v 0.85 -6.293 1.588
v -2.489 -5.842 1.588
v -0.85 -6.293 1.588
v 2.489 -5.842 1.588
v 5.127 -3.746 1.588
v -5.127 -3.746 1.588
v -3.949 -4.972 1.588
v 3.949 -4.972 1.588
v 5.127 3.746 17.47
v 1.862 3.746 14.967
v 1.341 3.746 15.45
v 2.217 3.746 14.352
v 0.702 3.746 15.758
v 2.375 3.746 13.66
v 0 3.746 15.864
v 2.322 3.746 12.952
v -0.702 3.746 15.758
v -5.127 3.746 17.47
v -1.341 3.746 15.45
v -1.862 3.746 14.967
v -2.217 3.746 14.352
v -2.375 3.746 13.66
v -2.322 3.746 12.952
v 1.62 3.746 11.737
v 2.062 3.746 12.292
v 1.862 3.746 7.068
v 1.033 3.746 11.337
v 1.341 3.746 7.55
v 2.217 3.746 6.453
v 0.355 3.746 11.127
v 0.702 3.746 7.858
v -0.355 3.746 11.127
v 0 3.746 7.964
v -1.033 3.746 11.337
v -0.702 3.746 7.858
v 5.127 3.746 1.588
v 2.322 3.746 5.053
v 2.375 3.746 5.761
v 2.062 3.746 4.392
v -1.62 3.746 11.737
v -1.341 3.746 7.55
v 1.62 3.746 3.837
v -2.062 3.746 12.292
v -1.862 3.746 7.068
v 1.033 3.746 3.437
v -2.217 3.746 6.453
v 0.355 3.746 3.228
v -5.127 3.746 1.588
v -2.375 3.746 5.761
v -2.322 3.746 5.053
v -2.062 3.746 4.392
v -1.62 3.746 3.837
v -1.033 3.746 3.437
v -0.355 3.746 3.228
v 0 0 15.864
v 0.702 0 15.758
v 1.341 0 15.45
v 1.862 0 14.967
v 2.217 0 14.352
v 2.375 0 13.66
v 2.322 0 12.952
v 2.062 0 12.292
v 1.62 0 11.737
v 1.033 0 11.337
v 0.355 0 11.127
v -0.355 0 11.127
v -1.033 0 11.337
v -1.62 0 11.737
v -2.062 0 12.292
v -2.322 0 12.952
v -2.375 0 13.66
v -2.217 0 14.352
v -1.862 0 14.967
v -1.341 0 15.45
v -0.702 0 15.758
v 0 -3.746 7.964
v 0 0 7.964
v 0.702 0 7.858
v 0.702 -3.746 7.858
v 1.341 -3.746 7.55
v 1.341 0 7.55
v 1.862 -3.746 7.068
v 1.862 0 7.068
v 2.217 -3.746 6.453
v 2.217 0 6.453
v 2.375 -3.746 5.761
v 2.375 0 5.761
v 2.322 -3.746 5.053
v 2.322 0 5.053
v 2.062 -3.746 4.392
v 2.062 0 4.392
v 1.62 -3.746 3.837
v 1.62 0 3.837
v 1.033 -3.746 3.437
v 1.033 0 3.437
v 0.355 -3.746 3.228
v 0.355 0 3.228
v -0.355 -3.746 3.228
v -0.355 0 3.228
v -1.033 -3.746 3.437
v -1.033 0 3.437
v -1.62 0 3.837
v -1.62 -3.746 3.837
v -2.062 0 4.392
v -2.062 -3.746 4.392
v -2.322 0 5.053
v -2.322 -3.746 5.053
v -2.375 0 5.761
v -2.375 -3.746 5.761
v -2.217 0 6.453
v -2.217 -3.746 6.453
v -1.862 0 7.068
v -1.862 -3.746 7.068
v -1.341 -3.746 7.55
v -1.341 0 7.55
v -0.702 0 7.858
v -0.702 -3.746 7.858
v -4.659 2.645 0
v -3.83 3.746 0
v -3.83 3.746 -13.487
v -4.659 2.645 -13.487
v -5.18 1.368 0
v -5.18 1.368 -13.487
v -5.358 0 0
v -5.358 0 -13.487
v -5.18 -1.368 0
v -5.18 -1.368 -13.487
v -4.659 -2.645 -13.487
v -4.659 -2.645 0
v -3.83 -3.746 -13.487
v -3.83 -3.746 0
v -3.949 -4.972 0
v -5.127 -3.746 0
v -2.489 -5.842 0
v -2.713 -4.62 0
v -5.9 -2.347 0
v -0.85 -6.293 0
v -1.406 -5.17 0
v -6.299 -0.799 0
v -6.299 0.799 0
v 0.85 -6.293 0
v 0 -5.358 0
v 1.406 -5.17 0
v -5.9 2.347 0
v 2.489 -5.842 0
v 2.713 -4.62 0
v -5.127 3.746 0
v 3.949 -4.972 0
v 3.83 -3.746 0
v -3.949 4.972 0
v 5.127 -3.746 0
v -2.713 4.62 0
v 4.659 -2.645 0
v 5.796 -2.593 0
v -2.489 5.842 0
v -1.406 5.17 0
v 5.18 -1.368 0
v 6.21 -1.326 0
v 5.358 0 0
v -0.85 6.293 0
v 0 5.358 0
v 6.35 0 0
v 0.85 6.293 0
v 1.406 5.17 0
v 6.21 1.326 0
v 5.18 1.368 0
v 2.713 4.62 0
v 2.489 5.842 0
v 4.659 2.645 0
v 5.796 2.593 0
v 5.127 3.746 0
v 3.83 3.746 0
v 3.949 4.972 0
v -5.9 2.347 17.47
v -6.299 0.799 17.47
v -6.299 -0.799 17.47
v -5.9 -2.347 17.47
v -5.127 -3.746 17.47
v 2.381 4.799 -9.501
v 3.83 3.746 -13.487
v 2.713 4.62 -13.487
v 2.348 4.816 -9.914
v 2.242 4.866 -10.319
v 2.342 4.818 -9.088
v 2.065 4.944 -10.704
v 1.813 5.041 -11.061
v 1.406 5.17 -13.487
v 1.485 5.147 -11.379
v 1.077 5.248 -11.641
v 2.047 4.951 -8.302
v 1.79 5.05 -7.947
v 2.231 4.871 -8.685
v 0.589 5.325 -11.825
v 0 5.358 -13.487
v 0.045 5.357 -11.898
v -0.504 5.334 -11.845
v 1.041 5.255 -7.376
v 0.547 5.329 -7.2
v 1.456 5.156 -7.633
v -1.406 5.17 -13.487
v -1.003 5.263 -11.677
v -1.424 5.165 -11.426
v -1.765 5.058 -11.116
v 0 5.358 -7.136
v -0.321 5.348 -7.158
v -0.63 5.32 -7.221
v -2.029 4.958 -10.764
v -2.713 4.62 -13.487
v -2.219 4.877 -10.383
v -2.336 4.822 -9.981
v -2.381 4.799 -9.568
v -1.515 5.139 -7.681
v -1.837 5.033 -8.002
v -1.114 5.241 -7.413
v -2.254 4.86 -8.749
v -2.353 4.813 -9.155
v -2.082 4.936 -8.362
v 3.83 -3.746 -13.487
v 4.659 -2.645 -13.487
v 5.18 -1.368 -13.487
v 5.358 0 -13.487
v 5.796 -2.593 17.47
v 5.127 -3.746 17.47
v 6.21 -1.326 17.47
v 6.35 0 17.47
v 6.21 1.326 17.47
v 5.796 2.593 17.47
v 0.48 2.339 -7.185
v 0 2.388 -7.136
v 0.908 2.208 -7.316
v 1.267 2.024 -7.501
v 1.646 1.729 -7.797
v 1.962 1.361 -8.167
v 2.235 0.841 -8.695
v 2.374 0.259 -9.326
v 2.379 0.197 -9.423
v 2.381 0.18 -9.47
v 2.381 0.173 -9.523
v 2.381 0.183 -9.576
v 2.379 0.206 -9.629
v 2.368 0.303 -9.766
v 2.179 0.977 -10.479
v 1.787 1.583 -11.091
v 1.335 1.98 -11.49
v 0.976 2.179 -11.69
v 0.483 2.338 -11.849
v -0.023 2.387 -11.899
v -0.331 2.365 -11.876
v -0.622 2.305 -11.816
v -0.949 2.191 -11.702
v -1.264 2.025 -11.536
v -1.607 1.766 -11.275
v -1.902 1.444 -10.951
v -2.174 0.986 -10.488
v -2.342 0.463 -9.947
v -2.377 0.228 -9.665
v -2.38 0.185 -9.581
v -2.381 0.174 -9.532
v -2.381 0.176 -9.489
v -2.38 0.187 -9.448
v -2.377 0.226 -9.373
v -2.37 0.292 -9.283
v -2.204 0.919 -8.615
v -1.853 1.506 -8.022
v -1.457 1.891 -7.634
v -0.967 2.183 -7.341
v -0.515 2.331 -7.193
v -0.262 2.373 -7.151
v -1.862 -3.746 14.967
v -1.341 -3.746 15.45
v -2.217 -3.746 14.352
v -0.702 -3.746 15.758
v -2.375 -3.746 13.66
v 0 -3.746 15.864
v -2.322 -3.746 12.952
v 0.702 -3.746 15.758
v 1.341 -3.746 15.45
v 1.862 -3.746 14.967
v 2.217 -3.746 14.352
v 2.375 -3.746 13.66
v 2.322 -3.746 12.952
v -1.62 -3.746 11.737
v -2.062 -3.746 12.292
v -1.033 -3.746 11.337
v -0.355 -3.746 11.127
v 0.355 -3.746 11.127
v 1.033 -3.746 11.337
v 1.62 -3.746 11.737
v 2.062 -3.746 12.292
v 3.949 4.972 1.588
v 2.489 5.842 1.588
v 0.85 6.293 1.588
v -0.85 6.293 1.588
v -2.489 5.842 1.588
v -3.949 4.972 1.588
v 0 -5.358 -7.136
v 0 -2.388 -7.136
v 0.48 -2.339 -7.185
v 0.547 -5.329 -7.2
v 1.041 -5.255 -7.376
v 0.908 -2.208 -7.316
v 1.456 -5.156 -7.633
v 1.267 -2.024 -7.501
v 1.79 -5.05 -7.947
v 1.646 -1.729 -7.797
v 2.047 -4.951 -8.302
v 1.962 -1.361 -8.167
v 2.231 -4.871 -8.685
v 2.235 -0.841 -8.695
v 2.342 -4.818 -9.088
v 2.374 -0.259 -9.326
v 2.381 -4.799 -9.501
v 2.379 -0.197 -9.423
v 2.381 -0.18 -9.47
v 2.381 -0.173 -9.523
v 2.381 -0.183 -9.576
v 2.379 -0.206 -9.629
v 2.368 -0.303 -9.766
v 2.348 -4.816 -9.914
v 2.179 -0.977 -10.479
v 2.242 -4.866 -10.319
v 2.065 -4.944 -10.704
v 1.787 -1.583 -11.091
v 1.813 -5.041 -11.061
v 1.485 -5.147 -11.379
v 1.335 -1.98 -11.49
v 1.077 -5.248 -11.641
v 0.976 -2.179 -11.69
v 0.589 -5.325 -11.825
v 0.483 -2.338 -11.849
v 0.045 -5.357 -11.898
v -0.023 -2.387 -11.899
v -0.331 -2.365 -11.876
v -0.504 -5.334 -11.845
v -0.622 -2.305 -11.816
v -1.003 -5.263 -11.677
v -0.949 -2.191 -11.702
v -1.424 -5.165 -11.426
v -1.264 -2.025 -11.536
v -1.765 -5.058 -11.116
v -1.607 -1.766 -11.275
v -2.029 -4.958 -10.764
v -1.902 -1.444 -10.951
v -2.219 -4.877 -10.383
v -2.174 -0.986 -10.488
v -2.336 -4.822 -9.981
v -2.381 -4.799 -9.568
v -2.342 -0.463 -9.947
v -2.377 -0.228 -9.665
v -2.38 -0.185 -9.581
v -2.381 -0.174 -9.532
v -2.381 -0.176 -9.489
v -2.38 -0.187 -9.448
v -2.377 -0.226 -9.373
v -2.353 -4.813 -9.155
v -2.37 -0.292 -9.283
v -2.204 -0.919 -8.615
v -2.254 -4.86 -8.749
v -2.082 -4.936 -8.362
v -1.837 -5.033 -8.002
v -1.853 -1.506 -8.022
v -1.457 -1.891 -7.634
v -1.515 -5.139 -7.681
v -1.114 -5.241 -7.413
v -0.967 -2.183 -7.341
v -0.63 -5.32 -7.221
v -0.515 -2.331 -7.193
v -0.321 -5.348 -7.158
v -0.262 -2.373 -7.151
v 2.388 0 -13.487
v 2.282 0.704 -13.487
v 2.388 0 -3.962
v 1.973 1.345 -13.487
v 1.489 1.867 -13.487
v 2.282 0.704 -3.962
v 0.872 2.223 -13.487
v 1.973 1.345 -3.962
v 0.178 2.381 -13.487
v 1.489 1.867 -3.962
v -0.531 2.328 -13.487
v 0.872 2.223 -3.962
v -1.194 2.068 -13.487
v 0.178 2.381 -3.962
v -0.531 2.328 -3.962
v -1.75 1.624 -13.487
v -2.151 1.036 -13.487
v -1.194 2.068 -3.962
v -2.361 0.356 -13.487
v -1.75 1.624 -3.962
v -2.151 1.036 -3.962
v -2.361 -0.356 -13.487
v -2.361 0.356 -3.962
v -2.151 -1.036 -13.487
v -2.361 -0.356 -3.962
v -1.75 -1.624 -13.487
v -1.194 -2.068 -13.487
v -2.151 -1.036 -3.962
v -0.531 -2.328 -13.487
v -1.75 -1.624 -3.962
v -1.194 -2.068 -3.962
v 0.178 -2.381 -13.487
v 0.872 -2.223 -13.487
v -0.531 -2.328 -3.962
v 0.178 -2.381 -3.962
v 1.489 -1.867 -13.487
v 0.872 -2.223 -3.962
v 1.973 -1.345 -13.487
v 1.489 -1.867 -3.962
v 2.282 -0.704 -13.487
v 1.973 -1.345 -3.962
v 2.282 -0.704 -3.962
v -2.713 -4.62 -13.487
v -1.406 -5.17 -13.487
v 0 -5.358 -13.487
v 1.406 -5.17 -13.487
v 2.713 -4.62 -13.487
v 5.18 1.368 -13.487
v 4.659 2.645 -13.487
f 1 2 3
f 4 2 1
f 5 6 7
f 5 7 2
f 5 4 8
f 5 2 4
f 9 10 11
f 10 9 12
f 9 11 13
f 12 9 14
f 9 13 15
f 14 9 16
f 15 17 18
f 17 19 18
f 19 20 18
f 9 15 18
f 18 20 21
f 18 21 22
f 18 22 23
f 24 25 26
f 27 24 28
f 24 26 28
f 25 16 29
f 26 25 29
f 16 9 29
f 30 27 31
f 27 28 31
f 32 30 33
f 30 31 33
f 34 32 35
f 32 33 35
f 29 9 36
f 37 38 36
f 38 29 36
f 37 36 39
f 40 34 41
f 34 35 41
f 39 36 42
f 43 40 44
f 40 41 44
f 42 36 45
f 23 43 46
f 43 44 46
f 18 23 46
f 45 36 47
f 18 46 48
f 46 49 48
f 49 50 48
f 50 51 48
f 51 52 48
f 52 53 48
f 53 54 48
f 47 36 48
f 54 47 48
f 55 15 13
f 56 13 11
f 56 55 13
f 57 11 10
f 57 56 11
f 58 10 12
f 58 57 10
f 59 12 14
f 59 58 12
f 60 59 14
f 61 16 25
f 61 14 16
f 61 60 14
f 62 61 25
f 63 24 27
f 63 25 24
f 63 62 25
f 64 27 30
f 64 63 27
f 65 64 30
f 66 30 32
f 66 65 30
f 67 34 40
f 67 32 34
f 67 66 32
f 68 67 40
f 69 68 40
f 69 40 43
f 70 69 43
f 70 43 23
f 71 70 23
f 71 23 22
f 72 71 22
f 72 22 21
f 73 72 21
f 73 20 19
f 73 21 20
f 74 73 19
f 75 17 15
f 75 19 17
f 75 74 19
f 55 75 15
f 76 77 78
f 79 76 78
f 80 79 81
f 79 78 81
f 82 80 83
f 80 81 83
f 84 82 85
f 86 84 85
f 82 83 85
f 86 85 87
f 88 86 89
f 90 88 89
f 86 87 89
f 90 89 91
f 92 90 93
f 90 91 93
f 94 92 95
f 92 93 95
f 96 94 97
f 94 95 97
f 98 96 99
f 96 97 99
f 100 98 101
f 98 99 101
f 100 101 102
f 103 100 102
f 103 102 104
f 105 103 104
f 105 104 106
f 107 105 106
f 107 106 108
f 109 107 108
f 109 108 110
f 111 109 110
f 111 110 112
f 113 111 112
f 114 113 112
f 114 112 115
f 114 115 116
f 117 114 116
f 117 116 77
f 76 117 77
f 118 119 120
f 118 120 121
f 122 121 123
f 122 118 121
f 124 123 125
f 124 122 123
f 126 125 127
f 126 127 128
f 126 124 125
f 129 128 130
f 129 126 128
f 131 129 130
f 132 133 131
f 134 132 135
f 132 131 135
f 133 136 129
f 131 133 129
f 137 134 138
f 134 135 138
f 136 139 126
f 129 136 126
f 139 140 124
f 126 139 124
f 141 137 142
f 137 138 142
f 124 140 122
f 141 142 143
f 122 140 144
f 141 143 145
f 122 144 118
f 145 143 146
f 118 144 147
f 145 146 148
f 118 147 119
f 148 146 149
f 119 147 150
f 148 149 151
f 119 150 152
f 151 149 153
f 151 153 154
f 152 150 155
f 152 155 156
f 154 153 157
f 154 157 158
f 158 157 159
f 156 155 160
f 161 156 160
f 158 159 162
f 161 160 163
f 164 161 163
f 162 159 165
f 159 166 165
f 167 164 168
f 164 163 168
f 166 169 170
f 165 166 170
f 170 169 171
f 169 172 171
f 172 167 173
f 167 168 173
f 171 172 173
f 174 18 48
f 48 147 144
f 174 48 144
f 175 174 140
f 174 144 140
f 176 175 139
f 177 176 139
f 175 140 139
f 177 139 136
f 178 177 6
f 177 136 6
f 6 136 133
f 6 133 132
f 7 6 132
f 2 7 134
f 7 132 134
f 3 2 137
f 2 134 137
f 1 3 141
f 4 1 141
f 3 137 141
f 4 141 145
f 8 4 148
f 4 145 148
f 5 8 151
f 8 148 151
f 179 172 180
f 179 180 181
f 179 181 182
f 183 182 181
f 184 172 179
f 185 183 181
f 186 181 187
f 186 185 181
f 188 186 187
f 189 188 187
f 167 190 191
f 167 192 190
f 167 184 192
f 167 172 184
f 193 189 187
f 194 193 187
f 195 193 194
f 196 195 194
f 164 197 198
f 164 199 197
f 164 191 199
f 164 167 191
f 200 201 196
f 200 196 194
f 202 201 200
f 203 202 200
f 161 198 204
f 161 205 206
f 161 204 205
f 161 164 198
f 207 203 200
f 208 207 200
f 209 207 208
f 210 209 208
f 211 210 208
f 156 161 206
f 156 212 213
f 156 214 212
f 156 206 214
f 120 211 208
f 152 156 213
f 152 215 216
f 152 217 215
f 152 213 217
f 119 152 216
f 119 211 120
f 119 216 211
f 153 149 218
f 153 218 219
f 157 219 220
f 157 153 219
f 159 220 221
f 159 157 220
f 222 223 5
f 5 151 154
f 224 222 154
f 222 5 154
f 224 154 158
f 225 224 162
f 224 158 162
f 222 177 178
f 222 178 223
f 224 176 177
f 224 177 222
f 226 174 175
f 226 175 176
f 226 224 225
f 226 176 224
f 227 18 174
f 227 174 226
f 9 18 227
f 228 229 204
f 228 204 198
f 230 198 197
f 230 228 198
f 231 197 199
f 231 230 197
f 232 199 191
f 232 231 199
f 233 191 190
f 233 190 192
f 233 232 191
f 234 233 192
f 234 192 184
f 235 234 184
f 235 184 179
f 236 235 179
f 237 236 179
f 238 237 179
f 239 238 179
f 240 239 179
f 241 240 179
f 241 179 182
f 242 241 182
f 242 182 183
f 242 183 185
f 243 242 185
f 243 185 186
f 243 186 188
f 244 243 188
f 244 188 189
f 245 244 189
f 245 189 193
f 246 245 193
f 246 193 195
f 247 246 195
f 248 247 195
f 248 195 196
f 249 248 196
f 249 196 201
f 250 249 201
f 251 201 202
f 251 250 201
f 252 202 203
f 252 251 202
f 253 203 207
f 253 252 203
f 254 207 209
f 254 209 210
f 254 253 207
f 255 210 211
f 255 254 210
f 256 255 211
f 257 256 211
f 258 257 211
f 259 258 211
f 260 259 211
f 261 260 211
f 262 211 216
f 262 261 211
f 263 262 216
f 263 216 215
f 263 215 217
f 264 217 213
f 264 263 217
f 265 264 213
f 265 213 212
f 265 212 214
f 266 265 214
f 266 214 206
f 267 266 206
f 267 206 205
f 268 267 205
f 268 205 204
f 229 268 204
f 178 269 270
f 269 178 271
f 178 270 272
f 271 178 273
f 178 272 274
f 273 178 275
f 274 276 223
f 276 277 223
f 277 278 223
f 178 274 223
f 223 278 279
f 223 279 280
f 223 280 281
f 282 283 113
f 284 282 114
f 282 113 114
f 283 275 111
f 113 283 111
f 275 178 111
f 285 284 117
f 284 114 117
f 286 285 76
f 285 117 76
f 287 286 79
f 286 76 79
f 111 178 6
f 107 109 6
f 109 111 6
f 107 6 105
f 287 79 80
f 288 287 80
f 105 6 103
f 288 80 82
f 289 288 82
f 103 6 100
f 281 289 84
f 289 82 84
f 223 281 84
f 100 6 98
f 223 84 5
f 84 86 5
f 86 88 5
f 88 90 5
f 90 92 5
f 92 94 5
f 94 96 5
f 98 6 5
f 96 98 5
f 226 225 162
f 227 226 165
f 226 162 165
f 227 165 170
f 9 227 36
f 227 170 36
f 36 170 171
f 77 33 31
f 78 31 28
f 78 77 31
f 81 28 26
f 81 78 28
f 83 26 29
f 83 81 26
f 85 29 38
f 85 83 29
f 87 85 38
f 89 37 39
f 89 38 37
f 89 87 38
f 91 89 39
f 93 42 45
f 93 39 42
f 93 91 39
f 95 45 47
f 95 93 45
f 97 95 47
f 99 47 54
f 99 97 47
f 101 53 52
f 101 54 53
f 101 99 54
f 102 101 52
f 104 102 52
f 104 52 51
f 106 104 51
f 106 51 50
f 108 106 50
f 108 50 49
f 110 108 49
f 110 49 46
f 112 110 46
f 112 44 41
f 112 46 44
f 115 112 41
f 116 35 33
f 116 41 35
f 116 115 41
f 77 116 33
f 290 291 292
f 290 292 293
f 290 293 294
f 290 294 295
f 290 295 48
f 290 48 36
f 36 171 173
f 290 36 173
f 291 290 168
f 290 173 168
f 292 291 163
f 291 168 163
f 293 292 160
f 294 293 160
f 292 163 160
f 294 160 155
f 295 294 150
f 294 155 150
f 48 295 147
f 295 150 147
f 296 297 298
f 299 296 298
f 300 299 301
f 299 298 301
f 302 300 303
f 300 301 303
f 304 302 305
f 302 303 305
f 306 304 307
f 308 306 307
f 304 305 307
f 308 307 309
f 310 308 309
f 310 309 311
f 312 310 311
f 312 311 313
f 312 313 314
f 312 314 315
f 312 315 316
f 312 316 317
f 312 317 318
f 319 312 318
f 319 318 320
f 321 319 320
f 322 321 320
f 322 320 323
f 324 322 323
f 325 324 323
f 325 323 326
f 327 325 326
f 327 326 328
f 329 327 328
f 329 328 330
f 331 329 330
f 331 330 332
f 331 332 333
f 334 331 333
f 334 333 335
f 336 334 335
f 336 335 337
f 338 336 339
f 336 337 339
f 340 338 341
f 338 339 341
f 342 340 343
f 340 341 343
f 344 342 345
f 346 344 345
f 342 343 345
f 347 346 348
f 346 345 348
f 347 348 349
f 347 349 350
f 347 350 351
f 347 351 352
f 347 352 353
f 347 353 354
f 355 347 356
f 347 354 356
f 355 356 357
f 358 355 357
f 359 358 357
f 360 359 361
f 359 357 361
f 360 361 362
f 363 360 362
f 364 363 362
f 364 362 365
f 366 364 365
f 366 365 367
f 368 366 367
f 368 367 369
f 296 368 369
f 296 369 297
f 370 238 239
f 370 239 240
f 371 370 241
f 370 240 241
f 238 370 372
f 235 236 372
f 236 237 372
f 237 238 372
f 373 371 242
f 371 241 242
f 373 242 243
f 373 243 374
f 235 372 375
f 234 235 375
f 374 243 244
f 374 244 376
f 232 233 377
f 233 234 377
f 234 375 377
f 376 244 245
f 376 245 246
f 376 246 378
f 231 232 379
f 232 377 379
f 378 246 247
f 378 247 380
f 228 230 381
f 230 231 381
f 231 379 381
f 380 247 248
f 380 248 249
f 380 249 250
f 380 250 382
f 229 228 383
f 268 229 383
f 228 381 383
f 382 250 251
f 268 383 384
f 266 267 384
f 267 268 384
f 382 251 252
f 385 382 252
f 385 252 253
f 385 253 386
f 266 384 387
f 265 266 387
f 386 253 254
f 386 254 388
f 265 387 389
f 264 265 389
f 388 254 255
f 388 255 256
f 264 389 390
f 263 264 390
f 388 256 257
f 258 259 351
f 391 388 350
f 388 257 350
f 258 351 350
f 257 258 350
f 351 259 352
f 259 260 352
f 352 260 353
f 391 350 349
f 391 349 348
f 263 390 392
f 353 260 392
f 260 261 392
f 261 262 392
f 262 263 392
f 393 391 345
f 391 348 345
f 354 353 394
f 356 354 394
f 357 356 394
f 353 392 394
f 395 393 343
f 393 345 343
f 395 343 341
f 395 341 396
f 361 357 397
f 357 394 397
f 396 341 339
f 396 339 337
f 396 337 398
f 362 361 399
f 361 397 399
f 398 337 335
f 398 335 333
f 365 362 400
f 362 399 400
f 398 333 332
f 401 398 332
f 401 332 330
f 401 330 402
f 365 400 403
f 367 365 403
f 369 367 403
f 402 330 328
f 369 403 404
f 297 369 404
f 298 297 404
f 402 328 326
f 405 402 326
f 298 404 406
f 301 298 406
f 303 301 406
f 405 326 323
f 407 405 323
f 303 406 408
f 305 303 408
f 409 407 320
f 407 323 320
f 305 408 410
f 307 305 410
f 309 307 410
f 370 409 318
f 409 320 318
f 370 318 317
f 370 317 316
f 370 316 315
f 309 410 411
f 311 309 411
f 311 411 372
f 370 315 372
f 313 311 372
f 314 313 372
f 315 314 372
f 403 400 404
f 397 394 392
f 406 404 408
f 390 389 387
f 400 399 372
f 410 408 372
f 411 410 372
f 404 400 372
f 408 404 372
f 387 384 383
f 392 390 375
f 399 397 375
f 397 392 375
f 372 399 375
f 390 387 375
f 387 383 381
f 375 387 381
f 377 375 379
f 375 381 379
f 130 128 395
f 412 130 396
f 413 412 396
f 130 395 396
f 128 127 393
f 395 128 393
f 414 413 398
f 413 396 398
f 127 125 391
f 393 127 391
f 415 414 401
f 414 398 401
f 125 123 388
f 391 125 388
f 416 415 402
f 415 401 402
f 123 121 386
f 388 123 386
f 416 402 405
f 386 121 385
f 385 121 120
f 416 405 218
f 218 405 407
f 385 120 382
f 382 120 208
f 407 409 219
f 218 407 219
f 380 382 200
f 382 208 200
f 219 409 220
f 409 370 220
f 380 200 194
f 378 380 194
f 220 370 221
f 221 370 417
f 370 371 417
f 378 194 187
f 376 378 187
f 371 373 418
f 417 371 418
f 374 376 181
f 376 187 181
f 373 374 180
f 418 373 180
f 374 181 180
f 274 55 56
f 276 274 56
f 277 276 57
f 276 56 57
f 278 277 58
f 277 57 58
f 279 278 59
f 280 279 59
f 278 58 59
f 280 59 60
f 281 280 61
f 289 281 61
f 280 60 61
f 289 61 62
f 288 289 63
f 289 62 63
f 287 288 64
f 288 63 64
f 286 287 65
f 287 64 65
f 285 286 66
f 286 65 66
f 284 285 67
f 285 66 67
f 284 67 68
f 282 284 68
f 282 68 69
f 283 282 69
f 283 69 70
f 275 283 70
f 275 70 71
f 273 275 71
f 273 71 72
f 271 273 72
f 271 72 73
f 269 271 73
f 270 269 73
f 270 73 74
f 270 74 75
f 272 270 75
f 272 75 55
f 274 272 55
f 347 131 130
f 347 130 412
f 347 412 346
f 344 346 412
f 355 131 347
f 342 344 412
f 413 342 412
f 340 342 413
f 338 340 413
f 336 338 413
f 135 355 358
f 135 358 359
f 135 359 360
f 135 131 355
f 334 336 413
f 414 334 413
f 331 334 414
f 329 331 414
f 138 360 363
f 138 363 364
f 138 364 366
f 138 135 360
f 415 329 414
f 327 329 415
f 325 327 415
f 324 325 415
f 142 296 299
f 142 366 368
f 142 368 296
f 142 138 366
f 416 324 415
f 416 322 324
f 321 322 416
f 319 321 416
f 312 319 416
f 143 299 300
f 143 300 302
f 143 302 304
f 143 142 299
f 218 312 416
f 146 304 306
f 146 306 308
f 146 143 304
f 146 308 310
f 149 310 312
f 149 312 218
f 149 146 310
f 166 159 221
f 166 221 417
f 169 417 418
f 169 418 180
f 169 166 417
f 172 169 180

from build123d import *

# Parameters (mm, degrees)
SKETCH1_R               = 2.3876
EXTRUDE1_DEPTH          = 17.47
EXTRUDE2_DEPTH          = 1.5875
SKETCH1_4_R             = 2.3876
EXTRUDE3_DEPTH          = 13.487
CUT_EXTRUDE1_START      = -3.9624
SKETCH1_5_R             = 2.3876
CUT_EXTRUDE1_DEPTH      = 13.487
SKETCH2_R               = 2.3813
CUT_EXTRUDE2_DEPTH      = 13.487
CUT_EXTRUDE2_DEPTH_BACK = 13.487


with BuildPart() as part:
    # Sketch1 → Extrude1 (new body)
    with BuildSketch(Plane.XY):
        with BuildLine():
            Line((3.829692416, 3.7465), (-3.829692416, 3.7465))
            ThreePointArc((-3.829692416, 3.7465), (-5.3575, 0), (-3.829692416, -3.7465))
            Line((-3.829692416, -3.7465), (3.829692416, -3.7465))
            ThreePointArc((3.829692416, -3.7465), (4.960866022, -2.023021148), (5.3575, 0))
            ThreePointArc((5.3575, 0), (4.960866022, 2.023021148), (3.829692416, 3.7465))
        make_face()
        Circle(SKETCH1_R, mode=Mode.SUBTRACT)
        with BuildLine():
            Line((-3.829692416, 3.7465), (-5.127010606, 3.7465))
            ThreePointArc((-5.127010606, 3.7465), (-6.35, 0), (-5.127010606, -3.7465))
            Line((-5.127010606, -3.7465), (-3.829692416, -3.7465))
            ThreePointArc((-3.829692416, -3.7465), (-5.3575, 0), (-3.829692416, 3.7465))
        make_face()
        with BuildLine():
            ThreePointArc((6.35, 0), (6.036514613, 1.970530722), (5.127010606, 3.7465))
            Line((5.127010606, 3.7465), (3.829692416, 3.7465))
            ThreePointArc((3.829692416, 3.7465), (4.960866022, 2.023021148), (5.3575, 0))
            ThreePointArc((5.3575, 0), (4.960866022, -2.023021148), (3.829692416, -3.7465))
            Line((3.829692416, -3.7465), (5.127010606, -3.7465))
            ThreePointArc((5.127010606, -3.7465), (6.036514613, -1.970530722), (6.35, 0))
        make_face()
        with BuildLine():
            Line((-3.829692416, 3.7465), (-5.127010606, 3.7465))
            ThreePointArc((-5.127010606, 3.7465), (-6.35, 0), (-5.127010606, -3.7465))
            Line((-5.127010606, -3.7465), (-3.829692416, -3.7465))
            ThreePointArc((-3.829692416, -3.7465), (-5.3575, 0), (-3.829692416, 3.7465))
        make_face()
        with BuildLine():
            ThreePointArc((6.35, 0), (6.036514613, 1.970530722), (5.127010606, 3.7465))
            Line((5.127010606, 3.7465), (3.829692416, 3.7465))
            ThreePointArc((3.829692416, 3.7465), (4.960866022, 2.023021148), (5.3575, 0))
            ThreePointArc((5.3575, 0), (4.960866022, -2.023021148), (3.829692416, -3.7465))
            Line((3.829692416, -3.7465), (5.127010606, -3.7465))
            ThreePointArc((5.127010606, -3.7465), (6.036514613, -1.970530722), (6.35, 0))
        make_face()
        Circle(SKETCH1_R)
    extrude(amount=EXTRUDE1_DEPTH)

    # Sketch1_3 → Extrude2 (add)
    with BuildSketch(Plane.XY):
        with BuildLine():
            ThreePointArc((5.127010606, 3.7465), (0, 6.35), (-5.127010606, 3.7465))
            Line((-5.127010606, 3.7465), (-3.829692416, 3.7465))
            ThreePointArc((-3.829692416, 3.7465), (0, 5.3575), (3.829692416, 3.7465))
            Line((3.829692416, 3.7465), (5.127010606, 3.7465))
        make_face()
        with BuildLine():
            ThreePointArc((3.829692416, 3.7465), (0, 5.3575), (-3.829692416, 3.7465))
            Line((-3.829692416, 3.7465), (3.829692416, 3.7465))
        make_face()
        with BuildLine():
            Line((-3.829692416, -3.7465), (-5.127010606, -3.7465))
            ThreePointArc((-5.127010606, -3.7465), (0, -6.35), (5.127010606, -3.7465))
            Line((5.127010606, -3.7465), (3.829692416, -3.7465))
            ThreePointArc((3.829692416, -3.7465), (0, -5.3575), (-3.829692416, -3.7465))
        make_face()
        with BuildLine():
            Line((3.829692416, -3.7465), (-3.829692416, -3.7465))
            ThreePointArc((-3.829692416, -3.7465), (0, -5.3575), (3.829692416, -3.7465))
        make_face()
    extrude(amount=EXTRUDE2_DEPTH)

    # Sketch1_4 → Extrude3 (add)
    with BuildSketch(Plane.XY):
        with BuildLine():
            Line((3.829692416, 3.7465), (-3.829692416, 3.7465))
            ThreePointArc((-3.829692416, 3.7465), (-5.3575, 0), (-3.829692416, -3.7465))
            Line((-3.829692416, -3.7465), (3.829692416, -3.7465))
            ThreePointArc((3.829692416, -3.7465), (4.960866022, -2.023021148), (5.3575, 0))
            ThreePointArc((5.3575, 0), (4.960866022, 2.023021148), (3.829692416, 3.7465))
        make_face()
        Circle(SKETCH1_4_R, mode=Mode.SUBTRACT)
        Circle(SKETCH1_4_R)
        with BuildLine():
            Line((3.829692416, -3.7465), (-3.829692416, -3.7465))
            ThreePointArc((-3.829692416, -3.7465), (0, -5.3575), (3.829692416, -3.7465))
        make_face()
        with BuildLine():
            ThreePointArc((3.829692416, 3.7465), (0, 5.3575), (-3.829692416, 3.7465))
            Line((-3.829692416, 3.7465), (3.829692416, 3.7465))
        make_face()
    extrude(amount=-EXTRUDE3_DEPTH)

    # Sketch1_5 → Cut-Extrude1 (cut)
    with BuildSketch(Plane.XY.offset(CUT_EXTRUDE1_START)):
        Circle(SKETCH1_5_R)
    extrude(amount=-CUT_EXTRUDE1_DEPTH, mode=Mode.SUBTRACT)

    # Sketch2 → Cut-Extrude2 (cut, two sides)
    with BuildSketch(Plane(origin=(0, 0, 0), x_dir=(1, 0, 0), z_dir=(0, 1, 0))) as cut_extrude2_sk:
        with Locations(Location((0, -5.5828, 0), (0, 0, 270))):  # turned: the seam where the file's is
            Circle(SKETCH2_R)
        with Locations(Location((0, -13.4822, 0), (0, 0, 270))):  # turned: the seam where the file's is
            Circle(SKETCH2_R)
        with Locations(Location((0, 9.5175, 0), (0, 0, 270))):  # turned: the seam where the file's is
            Circle(SKETCH2_R)
    extrude(amount=CUT_EXTRUDE2_DEPTH, mode=Mode.SUBTRACT)
    extrude(cut_extrude2_sk.sketch, amount=-CUT_EXTRUDE2_DEPTH_BACK, mode=Mode.SUBTRACT)


solid = part.part
